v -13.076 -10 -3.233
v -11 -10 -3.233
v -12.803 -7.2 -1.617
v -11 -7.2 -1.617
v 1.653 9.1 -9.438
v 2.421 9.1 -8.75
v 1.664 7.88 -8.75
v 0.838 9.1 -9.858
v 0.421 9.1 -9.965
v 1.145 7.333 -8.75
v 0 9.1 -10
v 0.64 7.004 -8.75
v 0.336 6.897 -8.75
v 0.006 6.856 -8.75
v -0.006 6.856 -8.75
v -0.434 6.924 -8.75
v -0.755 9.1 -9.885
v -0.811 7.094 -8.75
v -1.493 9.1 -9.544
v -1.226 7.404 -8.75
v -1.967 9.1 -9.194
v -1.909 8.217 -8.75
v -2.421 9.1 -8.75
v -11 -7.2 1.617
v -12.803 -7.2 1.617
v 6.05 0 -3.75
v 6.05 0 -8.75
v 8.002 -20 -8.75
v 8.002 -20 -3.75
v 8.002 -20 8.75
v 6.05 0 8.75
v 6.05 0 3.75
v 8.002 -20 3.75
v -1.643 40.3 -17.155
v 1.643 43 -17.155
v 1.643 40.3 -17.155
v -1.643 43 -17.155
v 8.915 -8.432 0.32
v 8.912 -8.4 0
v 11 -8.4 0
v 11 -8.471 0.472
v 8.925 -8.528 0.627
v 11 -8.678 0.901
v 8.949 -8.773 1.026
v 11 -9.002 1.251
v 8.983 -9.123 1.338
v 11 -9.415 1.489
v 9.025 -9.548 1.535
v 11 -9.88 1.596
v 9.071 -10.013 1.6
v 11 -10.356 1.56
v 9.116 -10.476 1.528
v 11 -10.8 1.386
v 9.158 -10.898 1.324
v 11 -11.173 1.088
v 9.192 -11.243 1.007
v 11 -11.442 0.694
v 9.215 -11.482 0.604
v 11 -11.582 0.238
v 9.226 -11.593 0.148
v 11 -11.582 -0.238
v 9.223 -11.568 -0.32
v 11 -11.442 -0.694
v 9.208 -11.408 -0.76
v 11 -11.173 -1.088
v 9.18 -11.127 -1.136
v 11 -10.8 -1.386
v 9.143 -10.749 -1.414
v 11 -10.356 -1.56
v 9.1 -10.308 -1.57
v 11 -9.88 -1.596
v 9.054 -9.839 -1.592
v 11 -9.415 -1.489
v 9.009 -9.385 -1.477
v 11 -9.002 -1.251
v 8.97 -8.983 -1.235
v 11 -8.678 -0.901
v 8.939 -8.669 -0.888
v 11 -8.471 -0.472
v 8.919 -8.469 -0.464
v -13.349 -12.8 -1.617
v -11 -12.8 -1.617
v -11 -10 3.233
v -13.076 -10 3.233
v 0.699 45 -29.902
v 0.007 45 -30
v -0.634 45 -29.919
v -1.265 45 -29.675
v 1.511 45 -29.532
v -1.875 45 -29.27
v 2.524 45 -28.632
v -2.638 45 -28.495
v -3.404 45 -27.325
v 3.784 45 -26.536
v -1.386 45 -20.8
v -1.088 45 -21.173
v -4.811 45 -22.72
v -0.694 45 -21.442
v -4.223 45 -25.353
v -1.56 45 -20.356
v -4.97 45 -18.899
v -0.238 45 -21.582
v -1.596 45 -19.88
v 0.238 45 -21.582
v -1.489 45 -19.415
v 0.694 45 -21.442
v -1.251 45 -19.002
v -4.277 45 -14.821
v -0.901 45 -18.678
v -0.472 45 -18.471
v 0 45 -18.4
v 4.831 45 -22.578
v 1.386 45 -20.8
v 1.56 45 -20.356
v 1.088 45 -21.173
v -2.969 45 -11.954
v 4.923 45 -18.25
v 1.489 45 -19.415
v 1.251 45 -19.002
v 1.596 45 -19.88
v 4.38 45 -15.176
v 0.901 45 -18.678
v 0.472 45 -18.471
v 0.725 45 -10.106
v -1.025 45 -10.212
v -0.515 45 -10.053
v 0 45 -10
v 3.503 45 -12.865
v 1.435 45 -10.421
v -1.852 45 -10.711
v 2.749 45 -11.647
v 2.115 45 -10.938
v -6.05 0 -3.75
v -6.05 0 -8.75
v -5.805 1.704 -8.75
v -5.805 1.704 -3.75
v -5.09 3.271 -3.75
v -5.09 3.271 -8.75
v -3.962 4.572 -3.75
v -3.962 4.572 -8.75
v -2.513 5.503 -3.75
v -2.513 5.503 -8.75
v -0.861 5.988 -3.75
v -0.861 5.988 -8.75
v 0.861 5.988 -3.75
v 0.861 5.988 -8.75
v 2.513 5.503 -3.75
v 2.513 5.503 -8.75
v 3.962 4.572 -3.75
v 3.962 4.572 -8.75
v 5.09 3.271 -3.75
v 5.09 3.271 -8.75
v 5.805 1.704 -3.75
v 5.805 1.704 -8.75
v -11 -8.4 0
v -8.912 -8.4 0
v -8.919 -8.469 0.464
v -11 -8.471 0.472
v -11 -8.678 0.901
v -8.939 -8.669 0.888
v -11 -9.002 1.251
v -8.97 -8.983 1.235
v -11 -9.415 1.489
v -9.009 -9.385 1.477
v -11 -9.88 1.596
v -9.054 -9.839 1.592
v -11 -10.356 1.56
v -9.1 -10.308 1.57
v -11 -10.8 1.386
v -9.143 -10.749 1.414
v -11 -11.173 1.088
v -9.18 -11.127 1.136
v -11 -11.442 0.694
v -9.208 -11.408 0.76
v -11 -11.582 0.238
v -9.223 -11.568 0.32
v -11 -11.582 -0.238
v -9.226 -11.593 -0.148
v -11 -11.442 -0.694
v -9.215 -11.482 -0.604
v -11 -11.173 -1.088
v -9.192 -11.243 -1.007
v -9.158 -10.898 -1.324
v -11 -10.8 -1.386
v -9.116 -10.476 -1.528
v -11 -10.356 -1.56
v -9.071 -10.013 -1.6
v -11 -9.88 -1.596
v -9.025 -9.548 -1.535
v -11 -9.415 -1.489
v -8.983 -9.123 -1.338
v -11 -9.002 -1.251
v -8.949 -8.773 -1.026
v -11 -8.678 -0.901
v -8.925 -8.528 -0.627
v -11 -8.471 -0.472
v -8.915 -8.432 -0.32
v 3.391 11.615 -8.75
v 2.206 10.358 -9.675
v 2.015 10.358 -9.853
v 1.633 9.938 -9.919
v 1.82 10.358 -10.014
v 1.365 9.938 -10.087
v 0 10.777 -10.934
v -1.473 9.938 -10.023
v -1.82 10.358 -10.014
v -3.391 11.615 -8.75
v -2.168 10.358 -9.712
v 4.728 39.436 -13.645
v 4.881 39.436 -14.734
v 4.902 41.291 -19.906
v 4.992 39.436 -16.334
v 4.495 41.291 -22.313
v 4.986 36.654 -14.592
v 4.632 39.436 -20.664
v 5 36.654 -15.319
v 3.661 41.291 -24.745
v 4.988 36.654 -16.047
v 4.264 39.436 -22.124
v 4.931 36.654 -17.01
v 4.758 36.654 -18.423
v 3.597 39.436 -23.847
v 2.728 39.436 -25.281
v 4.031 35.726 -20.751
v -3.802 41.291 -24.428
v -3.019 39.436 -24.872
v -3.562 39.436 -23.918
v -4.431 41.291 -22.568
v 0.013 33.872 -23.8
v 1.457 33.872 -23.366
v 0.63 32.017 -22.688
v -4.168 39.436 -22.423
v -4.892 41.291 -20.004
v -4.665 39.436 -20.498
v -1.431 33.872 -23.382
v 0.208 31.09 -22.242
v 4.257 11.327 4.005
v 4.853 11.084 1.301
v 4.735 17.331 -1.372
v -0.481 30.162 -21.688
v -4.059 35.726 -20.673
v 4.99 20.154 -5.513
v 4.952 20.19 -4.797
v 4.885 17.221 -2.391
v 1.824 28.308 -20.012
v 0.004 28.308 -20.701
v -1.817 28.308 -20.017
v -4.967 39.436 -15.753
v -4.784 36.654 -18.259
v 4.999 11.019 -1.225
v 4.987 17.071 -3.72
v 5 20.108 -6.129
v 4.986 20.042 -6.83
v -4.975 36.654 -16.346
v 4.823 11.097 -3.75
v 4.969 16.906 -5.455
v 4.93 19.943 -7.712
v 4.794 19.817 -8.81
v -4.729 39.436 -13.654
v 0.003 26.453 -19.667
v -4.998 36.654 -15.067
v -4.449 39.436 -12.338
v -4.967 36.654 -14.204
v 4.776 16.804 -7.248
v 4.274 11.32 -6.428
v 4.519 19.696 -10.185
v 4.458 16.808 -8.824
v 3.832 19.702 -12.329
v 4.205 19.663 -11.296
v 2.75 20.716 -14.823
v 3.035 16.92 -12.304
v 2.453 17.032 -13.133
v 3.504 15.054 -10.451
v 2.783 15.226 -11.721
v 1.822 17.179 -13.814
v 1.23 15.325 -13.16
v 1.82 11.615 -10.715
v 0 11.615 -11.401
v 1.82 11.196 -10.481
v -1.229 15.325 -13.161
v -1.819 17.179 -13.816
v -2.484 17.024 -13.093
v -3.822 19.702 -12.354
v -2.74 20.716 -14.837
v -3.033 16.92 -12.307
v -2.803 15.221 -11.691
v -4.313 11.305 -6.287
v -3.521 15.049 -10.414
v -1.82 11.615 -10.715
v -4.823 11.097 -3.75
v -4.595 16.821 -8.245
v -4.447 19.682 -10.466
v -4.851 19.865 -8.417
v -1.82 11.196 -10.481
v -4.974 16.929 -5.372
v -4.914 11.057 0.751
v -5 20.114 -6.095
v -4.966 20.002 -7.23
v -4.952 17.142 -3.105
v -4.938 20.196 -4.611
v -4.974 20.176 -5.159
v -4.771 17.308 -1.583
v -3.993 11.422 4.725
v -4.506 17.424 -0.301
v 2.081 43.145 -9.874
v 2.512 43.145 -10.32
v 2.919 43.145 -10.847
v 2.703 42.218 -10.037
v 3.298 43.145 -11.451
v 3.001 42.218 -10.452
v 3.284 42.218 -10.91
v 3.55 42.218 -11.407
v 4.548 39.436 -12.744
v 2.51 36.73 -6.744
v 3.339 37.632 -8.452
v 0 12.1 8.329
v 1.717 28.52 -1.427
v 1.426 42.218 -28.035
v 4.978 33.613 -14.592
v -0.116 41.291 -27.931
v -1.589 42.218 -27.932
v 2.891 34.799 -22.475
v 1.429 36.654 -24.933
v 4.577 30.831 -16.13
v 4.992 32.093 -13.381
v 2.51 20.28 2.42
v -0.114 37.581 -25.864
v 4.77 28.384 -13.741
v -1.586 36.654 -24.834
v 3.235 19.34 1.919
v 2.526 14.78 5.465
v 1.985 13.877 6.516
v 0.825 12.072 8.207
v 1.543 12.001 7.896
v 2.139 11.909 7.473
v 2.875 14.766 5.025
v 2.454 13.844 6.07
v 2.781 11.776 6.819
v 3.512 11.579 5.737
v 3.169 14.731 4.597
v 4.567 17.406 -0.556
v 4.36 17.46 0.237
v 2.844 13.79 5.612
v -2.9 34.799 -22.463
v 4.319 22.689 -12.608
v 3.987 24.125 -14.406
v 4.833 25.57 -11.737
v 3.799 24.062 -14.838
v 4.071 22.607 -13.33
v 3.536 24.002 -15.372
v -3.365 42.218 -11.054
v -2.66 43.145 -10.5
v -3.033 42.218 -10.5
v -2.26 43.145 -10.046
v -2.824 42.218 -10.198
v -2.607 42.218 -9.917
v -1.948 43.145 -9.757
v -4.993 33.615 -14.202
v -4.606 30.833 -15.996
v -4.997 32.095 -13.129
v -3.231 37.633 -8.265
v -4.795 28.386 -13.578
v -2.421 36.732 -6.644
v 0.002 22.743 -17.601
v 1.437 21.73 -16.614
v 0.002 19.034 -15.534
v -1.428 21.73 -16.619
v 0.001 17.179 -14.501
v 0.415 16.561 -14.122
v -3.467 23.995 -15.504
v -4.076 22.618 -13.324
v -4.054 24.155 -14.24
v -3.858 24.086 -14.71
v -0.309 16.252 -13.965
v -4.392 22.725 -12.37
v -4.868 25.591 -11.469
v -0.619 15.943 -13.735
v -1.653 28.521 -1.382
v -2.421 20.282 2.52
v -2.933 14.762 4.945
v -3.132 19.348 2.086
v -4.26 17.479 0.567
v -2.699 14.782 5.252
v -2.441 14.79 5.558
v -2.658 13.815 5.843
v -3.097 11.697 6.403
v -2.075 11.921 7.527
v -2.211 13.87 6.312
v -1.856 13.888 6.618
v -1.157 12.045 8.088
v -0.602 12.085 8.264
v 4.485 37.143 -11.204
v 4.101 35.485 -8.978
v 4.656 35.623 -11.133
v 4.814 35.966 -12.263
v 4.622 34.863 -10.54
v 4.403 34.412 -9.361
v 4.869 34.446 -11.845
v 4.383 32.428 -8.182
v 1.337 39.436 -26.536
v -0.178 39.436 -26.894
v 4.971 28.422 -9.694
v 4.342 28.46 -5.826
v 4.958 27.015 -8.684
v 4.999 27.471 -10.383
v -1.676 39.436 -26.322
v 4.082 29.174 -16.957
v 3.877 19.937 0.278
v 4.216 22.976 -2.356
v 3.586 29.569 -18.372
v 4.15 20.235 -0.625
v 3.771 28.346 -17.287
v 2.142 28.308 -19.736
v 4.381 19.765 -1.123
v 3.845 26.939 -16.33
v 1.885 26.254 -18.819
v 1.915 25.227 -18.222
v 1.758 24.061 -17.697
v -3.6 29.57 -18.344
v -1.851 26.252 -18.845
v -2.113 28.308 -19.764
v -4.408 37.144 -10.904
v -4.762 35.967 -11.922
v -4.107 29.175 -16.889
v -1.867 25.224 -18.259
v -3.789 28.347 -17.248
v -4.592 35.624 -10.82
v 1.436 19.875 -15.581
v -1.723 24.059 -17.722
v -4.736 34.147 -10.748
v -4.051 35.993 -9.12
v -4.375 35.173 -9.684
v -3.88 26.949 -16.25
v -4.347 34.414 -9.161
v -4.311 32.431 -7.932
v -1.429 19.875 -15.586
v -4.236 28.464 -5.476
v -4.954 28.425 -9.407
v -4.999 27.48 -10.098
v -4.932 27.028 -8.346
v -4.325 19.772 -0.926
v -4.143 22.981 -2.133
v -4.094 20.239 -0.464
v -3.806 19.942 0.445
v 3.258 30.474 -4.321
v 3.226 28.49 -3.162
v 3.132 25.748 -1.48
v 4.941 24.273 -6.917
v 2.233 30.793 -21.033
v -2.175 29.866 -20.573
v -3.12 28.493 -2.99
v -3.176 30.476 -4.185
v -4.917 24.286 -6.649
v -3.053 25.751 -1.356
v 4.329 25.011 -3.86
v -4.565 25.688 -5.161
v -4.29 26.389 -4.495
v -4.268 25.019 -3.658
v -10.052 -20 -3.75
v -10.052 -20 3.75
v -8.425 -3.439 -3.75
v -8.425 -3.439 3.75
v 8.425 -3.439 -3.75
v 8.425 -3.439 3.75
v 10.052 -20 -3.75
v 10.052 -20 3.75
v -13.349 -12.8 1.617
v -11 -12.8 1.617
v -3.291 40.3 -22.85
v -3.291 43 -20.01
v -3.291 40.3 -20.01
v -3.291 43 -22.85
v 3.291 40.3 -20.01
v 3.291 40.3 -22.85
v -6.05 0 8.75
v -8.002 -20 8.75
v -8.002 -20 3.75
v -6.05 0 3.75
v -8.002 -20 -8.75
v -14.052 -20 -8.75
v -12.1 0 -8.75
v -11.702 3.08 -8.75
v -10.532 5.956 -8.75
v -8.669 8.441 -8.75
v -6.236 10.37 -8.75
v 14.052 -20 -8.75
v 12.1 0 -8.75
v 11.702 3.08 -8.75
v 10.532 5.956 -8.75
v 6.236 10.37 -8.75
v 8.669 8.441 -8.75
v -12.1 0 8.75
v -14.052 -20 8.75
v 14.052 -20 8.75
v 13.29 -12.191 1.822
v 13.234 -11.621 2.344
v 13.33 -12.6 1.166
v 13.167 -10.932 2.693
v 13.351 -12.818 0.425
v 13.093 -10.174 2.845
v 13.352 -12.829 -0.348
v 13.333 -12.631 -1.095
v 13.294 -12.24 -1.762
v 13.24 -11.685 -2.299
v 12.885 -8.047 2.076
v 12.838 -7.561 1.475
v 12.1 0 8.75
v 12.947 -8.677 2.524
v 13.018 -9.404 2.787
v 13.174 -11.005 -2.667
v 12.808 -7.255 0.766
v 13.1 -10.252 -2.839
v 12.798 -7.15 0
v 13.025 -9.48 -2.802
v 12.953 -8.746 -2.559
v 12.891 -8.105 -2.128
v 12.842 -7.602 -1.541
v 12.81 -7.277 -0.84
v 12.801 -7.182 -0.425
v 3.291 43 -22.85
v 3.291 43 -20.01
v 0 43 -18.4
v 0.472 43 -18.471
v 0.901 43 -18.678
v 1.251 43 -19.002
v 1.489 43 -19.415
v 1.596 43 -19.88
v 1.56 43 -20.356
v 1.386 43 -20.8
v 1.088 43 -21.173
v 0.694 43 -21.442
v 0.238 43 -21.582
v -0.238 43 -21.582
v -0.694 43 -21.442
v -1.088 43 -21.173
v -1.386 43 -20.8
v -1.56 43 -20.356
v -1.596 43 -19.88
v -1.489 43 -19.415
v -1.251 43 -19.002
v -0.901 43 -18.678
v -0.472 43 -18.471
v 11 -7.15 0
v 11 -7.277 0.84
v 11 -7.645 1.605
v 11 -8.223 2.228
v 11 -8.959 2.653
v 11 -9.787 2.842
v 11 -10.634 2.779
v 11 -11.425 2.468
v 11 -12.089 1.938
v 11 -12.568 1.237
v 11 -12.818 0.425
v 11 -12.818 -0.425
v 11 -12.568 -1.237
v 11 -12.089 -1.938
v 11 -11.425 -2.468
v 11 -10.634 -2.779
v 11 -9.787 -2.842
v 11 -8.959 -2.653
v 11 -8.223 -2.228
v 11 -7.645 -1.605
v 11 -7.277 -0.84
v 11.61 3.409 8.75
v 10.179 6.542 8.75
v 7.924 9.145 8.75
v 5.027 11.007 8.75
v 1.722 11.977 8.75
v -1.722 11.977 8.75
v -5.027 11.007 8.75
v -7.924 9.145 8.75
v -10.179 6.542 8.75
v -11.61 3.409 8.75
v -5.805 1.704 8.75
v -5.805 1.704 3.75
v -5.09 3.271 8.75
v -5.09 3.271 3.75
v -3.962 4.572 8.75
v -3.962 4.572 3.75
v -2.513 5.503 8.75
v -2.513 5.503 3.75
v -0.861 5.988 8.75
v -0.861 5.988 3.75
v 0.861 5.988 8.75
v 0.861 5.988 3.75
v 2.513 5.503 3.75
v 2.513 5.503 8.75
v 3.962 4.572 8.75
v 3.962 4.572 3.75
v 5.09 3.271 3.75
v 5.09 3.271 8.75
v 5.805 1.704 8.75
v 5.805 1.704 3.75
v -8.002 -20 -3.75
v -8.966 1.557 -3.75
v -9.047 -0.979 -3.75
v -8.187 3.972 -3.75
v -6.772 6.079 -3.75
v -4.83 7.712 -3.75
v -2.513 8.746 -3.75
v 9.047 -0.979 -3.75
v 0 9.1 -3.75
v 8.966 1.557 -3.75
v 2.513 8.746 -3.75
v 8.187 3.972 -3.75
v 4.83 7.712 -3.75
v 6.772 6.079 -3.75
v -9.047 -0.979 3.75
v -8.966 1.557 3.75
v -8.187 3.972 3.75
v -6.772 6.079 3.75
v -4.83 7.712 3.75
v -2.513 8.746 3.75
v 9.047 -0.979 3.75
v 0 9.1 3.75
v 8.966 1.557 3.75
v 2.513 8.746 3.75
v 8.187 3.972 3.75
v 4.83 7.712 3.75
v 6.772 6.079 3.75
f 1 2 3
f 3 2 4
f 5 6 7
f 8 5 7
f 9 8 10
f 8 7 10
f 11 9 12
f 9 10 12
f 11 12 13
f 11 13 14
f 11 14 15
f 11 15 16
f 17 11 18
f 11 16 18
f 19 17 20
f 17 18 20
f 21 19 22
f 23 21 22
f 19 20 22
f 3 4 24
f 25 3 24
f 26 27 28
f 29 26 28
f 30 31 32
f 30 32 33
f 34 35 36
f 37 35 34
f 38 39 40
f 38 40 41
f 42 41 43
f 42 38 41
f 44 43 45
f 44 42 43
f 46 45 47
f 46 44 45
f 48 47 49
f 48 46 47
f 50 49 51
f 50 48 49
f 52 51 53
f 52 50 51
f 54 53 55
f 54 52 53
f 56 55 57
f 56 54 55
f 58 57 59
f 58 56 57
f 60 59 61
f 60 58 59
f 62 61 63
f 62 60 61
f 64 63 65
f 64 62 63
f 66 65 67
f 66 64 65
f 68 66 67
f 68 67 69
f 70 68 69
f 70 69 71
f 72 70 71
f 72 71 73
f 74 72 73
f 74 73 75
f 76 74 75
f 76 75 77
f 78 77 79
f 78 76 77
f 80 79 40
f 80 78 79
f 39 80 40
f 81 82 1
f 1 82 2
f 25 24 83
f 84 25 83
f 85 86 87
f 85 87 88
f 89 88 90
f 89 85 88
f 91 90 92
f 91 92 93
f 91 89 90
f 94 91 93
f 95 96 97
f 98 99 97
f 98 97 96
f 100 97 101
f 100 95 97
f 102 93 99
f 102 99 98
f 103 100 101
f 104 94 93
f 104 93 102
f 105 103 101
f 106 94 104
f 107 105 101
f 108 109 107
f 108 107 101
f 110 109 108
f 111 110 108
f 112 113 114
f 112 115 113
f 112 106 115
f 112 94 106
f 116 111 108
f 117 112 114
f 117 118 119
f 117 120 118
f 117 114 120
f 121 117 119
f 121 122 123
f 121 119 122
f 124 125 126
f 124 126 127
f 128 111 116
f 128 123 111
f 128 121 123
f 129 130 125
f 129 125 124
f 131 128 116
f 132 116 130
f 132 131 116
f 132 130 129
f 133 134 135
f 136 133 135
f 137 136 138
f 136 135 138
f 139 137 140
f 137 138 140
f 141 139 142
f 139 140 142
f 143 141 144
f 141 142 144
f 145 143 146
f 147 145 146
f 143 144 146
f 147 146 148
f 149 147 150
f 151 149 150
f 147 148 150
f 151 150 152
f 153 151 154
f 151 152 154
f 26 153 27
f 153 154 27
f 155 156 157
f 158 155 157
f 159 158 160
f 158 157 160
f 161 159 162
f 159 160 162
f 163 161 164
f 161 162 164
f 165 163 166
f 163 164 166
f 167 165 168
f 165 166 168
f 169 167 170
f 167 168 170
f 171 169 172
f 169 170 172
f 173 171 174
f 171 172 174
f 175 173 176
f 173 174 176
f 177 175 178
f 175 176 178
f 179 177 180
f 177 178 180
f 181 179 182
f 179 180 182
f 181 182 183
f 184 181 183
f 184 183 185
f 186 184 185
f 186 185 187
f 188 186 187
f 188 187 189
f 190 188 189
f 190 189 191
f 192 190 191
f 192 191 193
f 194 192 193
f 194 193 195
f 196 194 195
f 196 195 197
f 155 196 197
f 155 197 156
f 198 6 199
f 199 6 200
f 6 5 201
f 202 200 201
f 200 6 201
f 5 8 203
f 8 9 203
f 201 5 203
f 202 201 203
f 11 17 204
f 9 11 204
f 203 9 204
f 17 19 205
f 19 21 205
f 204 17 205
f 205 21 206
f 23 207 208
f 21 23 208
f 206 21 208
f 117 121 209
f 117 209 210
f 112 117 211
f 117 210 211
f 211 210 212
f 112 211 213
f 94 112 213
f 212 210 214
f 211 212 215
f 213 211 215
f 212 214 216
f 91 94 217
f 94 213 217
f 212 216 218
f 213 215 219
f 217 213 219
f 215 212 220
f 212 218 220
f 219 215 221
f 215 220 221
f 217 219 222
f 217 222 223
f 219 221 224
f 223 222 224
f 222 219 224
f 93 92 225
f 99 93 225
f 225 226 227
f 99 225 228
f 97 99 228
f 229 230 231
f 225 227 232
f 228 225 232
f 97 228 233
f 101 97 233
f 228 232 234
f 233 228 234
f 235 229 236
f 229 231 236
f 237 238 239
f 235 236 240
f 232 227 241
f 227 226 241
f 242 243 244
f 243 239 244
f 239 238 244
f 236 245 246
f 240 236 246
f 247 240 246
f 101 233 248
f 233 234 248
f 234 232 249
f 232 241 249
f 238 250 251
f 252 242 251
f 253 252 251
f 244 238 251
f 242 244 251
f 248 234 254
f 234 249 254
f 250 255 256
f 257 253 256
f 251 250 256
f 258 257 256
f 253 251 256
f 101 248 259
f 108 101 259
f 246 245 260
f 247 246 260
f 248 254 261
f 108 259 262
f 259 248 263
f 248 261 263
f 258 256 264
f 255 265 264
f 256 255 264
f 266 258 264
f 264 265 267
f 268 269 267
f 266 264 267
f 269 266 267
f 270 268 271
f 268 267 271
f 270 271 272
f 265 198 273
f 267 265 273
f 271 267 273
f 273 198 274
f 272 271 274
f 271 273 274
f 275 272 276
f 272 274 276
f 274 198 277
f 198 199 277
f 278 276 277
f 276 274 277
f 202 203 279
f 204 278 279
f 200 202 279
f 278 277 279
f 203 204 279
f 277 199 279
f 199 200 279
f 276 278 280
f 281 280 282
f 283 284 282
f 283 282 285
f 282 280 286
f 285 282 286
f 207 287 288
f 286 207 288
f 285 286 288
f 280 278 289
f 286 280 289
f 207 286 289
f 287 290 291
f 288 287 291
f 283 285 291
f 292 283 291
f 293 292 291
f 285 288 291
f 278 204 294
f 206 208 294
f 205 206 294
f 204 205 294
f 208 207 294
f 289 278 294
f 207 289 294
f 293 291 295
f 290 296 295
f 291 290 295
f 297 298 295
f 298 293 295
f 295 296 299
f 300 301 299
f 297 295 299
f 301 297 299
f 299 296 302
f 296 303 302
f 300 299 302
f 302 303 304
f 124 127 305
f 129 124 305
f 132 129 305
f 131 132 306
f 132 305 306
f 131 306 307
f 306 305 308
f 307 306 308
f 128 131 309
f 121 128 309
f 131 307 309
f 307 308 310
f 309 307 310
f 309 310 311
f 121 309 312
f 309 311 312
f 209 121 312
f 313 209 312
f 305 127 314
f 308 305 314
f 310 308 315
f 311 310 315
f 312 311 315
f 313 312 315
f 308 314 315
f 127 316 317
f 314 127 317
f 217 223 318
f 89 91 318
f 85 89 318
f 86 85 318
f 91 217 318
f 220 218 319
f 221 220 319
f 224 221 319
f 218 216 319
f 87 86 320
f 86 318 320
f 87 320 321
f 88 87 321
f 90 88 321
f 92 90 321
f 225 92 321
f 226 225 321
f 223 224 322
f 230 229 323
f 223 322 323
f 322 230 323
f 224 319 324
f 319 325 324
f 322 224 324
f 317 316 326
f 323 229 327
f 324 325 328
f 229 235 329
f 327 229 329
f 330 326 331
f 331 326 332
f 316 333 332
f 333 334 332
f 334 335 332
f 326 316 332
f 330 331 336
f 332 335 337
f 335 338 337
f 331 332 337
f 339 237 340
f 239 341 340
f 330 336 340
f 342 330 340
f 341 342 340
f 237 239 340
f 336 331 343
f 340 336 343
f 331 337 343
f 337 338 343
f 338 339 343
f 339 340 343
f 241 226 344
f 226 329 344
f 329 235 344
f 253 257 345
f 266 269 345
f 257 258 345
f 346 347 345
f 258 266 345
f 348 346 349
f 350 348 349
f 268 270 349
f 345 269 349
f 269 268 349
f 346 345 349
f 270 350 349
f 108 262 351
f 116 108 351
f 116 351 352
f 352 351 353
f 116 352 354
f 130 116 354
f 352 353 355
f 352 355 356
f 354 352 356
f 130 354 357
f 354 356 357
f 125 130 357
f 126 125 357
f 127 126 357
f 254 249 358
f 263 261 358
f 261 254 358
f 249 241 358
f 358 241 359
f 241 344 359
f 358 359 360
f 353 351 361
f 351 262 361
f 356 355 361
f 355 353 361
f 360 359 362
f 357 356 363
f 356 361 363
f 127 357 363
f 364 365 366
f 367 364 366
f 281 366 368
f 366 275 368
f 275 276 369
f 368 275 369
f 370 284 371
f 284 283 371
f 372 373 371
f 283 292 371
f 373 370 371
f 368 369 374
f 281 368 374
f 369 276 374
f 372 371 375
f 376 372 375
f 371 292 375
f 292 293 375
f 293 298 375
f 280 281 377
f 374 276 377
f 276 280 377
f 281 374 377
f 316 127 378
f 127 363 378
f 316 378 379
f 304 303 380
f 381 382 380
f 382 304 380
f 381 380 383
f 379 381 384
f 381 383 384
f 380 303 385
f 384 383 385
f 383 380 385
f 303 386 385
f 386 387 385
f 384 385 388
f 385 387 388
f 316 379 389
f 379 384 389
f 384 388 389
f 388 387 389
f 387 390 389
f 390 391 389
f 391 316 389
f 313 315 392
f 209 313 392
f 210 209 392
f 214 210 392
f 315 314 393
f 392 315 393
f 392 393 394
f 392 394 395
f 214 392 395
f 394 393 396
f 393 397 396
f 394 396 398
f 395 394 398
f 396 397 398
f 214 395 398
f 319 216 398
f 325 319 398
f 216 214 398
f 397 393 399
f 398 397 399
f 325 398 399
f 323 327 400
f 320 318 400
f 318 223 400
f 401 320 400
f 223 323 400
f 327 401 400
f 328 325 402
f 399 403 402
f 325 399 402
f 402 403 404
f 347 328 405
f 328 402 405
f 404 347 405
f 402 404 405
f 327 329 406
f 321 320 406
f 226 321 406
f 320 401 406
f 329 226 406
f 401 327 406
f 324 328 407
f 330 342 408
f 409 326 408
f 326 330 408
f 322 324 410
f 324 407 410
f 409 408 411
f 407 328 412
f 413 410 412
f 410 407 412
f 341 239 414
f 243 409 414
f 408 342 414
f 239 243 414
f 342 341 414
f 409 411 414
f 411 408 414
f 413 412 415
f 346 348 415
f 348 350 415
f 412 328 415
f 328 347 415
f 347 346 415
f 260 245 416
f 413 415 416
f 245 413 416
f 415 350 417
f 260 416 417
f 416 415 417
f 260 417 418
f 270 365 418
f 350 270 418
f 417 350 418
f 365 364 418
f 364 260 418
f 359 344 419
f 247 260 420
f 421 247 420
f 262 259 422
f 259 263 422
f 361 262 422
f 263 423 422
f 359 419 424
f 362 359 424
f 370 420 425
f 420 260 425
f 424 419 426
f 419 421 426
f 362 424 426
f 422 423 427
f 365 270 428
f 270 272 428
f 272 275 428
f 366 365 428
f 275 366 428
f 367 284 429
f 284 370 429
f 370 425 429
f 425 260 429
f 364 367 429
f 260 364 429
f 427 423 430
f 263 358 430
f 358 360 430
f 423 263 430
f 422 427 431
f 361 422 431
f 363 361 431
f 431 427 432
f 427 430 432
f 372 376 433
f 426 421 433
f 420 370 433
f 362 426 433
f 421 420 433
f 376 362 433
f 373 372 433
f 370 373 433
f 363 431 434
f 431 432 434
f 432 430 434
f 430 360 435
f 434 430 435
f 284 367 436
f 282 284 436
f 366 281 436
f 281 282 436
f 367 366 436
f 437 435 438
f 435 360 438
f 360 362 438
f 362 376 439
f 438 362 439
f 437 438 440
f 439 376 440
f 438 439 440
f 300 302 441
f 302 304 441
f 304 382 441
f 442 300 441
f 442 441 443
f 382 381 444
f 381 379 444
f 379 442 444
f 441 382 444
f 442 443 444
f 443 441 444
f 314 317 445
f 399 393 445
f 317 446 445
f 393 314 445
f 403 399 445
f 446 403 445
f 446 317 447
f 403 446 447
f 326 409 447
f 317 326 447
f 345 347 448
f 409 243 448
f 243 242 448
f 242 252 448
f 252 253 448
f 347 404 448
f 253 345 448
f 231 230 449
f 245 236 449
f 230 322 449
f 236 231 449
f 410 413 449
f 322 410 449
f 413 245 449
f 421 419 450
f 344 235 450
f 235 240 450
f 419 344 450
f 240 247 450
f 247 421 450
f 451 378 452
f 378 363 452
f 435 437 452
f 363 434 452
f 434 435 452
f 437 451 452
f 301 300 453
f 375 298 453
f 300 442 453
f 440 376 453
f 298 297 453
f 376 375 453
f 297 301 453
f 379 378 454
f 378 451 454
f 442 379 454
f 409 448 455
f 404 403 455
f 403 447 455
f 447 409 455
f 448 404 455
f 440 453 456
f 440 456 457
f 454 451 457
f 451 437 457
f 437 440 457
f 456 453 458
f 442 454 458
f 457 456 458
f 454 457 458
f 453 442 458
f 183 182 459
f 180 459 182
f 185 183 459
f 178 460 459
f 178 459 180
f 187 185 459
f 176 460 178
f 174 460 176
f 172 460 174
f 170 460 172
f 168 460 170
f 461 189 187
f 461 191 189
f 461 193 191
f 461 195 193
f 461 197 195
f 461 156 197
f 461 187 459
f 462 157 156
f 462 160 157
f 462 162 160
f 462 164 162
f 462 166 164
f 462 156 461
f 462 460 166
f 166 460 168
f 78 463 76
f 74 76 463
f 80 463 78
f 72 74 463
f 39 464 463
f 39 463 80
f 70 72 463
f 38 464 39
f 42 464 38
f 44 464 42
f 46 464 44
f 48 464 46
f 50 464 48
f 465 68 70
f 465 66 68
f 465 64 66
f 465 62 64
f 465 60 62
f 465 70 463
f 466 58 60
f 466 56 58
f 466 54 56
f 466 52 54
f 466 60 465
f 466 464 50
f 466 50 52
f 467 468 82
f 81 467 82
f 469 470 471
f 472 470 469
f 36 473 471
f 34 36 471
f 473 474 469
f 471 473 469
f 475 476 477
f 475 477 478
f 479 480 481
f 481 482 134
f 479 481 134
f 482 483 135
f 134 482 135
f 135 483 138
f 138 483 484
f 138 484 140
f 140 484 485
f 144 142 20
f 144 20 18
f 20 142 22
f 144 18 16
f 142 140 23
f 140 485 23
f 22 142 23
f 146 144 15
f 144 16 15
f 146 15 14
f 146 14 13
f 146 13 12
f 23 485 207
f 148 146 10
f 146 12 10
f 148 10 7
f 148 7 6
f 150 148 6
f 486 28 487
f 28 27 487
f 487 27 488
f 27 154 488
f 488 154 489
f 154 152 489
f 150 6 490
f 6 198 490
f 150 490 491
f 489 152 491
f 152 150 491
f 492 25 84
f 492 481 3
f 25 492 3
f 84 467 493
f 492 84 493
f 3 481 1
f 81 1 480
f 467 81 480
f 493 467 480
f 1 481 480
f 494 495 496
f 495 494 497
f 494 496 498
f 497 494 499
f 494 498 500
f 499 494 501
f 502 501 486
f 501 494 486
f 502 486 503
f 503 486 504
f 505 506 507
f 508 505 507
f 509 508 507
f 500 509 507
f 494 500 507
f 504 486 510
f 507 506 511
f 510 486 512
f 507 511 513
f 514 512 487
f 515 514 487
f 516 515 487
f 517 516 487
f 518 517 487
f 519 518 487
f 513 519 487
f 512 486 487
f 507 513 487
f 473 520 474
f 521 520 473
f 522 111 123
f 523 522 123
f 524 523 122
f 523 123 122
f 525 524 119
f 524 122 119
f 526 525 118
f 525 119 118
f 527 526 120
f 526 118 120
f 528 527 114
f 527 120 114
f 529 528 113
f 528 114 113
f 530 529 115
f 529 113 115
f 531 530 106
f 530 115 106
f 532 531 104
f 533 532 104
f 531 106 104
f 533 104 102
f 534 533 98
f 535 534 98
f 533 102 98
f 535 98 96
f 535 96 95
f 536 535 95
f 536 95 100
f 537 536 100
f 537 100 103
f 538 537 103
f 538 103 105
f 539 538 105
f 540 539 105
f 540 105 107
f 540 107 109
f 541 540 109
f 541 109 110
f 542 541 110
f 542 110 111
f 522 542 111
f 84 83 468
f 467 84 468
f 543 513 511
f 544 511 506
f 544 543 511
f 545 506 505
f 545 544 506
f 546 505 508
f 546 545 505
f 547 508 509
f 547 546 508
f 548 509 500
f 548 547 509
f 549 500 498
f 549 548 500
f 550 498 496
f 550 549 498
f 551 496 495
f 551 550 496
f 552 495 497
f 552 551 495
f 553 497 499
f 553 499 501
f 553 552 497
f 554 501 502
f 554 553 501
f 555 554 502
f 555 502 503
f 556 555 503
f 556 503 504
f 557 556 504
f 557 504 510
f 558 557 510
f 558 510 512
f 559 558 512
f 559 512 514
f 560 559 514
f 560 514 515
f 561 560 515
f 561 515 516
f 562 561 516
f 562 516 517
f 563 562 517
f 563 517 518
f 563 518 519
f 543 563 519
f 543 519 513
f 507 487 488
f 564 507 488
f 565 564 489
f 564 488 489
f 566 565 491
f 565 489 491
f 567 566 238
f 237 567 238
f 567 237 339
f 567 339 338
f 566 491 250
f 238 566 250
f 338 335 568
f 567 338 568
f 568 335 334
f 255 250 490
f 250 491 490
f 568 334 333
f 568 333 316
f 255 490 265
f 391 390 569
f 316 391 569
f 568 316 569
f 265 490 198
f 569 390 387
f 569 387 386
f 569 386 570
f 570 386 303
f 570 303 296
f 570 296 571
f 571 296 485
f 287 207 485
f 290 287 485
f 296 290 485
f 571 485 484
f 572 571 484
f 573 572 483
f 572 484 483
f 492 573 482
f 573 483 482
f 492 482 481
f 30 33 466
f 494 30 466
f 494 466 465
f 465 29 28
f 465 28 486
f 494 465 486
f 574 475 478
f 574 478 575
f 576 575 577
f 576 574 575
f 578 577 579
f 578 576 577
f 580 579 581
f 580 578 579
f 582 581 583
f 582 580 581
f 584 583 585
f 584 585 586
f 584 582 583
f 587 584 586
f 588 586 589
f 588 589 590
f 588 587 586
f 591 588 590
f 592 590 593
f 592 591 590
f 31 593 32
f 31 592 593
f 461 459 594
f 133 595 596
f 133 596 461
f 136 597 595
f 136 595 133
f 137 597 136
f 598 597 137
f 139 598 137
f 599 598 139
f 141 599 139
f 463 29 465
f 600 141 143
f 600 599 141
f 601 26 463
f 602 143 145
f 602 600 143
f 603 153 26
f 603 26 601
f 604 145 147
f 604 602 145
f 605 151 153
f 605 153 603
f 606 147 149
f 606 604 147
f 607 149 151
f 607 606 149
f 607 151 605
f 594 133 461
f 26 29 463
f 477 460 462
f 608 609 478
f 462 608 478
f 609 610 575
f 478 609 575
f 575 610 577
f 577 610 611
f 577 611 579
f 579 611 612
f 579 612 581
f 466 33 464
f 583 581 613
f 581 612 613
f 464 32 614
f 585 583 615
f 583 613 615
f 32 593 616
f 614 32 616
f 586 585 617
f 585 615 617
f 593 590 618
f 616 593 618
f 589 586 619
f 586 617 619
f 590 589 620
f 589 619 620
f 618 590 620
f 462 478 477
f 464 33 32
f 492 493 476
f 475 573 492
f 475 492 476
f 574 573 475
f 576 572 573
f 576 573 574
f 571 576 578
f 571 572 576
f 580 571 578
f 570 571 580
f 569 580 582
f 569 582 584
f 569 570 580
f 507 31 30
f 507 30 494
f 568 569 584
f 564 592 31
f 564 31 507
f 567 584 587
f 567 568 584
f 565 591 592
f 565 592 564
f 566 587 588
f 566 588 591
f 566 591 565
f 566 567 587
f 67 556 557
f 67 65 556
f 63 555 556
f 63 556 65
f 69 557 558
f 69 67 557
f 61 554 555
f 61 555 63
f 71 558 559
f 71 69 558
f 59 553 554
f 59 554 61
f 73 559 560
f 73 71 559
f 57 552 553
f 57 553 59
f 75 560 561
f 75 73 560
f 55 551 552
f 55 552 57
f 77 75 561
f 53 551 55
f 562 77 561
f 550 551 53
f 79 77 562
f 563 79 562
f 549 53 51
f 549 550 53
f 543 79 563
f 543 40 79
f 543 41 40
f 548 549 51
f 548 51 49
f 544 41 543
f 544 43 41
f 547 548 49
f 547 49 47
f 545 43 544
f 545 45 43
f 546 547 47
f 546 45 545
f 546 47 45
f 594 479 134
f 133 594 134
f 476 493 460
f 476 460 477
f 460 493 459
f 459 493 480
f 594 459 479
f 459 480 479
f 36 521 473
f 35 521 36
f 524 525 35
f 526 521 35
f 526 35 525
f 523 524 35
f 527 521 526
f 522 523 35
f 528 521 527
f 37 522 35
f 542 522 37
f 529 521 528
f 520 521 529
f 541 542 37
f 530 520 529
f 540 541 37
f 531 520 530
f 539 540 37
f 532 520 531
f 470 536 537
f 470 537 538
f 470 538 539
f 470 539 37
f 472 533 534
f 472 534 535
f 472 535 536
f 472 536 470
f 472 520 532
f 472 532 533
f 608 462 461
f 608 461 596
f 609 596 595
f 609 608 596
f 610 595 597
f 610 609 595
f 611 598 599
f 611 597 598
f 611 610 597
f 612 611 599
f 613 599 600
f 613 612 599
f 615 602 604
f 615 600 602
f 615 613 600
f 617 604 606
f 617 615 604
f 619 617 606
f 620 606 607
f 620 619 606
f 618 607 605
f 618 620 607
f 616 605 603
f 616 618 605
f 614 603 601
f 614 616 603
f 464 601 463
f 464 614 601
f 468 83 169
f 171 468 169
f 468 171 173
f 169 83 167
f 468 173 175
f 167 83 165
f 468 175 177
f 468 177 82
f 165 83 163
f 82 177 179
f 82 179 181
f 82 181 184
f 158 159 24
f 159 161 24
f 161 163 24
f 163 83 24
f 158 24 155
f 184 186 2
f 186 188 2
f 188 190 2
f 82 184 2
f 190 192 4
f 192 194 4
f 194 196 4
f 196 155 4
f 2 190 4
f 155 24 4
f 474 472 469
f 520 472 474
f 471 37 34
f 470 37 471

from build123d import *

# Parameters (mm, degrees)
BOSS_EXTRUDE1_DEPTH         = 3.75
BOLT_HOLE_REACH             = 26.729
SKETCH2_R                   = 1.6
BOLT_HOLE_DIRECTION_2_REACH = 26.729
BOSS_EXTRUDE2_START         = 5
BOSS_EXTRUDE2_DEPTH         = 5
CUT_EXTRUDE2_START          = 11
SKETCH4_R                   = 2.85
CUT_EXTRUDE2_DEPTH          = 3
SKETCH7_RX                  = 10
SKETCH7_RY                  = 5
SWEEP2_START                = 10.247926509
SWEEP2_DEPTH                = 2.568432868
SKETCH11_W                  = 7.251223943
SKETCH11_H                  = 3.177760732
CUT_EXTRUDE3_DEPTH          = 20
CUT_EXTRUDE5_START          = -2
CUT_EXTRUDE5_DEPTH          = 2.7
SKETCH13_R                  = 1.6
CUT_EXTRUDE6_DEPTH          = 2.7
CUT_EXTRUDE7_START          = -11
CUT_EXTRUDE7_DEPTH          = 10


# Read off the part's stored shape, not the designer's step: Sweep2
with BuildPart() as part:
    # Sketch1 → Boss-Extrude1 (new, symmetric)
    with BuildSketch(Plane.XY):
        with BuildLine():
            Line((-12.1, 0), (-14.051700625, -20))
            Line((-14.051700625, -20), (-10.051700625, -20))
            Line((-10.051700625, -20), (-8.425, -3.439385846))
            ThreePointArc((-8.425, -3.439385846), (0, 9.1), (8.425, -3.439385846))
            Line((8.425, -3.439385846), (10.051700625, -20))
            Line((10.051700625, -20), (14.051700625, -20))
            Line((14.051700625, -20), (12.1, 0))
            ThreePointArc((12.1, 0), (0, 12.1), (-12.1, 0))
        make_face()
    extrude(amount=BOSS_EXTRUDE1_DEPTH, both=True)

    # Bolt Hole: up to this plane
    bolt_hole_end = Plane(origin=(14.051700625, -20, 3.75), z_dir=(-0.995272319868323, -0.09712368044883128, 0))
    # Sketch2 → Bolt Hole (cut, up to the surface)
    with BuildSketch(Plane(origin=(0, 0, 0), x_dir=(0, 0, -1), z_dir=(1, 0, 0)), mode=Mode.PRIVATE) as bolt_hole_sk1:
        with Locations(Location((0, -10, 0), (0, 0, 90))):
            Circle(SKETCH2_R)
    bolt_hole_tool1 = split(extrude(bolt_hole_sk1.sketch, amount=BOLT_HOLE_REACH, mode=Mode.PRIVATE), bisect_by=bolt_hole_end, keep=Keep.BOTH, mode=Mode.PRIVATE)
    add(bolt_hole_tool1.solids().sort_by_distance((0, -10, 0))[0], mode=Mode.SUBTRACT)

    # Bolt Hole direction 2: up to this plane
    bolt_hole_direction_2_end = Plane(origin=(-12.1, 0, 3.75), z_dir=(0.995272319868323, -0.09712368044883138, 0))
    # Sketch2 → Bolt Hole direction 2 (cut, up to the surface)
    with BuildSketch(Plane(origin=(0, 0, 0), x_dir=(0, 0, -1), z_dir=(1, 0, 0)), mode=Mode.PRIVATE) as bolt_hole_direction_2_sk1:
        with Locations(Location((0, -10, 0), (0, 0, 90))):
            Circle(SKETCH2_R)
    bolt_hole_direction_2_tool1 = split(extrude(bolt_hole_direction_2_sk1.sketch, amount=-BOLT_HOLE_DIRECTION_2_REACH, mode=Mode.PRIVATE), bisect_by=bolt_hole_direction_2_end, keep=Keep.BOTH, mode=Mode.PRIVATE)
    add(bolt_hole_direction_2_tool1.solids().sort_by_distance((0, -10, 0))[0], mode=Mode.SUBTRACT)

    # Sketch3 → Boss-Extrude2 (add)
    with BuildSketch(Plane.XY.offset(3.75).offset(BOSS_EXTRUDE2_START)):
        with BuildLine():
            ThreePointArc((12.1, 0), (0, 12.1), (-12.1, 0))
            Line((-12.1, 0), (-6.05, 0))
            ThreePointArc((-6.05, 0), (0, 6.05), (6.05, 0))
            Line((6.05, 0), (12.1, 0))
        make_face()
        Polygon((-6.05, 0), (-12.1, 0), (-14.051700625, -20), (-8.001700625, -20), align=None)
        Polygon((14.051700625, -20), (12.1, 0), (6.05, 0), (8.001700625, -20), align=None)
    boss_extrude2 = extrude(amount=-BOSS_EXTRUDE2_DEPTH)

    # Sketch4 → Cut-Extrude2 (cut)
    with BuildSketch(Plane(origin=(0, 0, 0), x_dir=(0, 0, -1), z_dir=(1, 0, 0)).offset(CUT_EXTRUDE2_START)):
        with Locations(Location((0, -10, 0), (0, 0, 90))):
            Circle(SKETCH4_R)
    extrude(amount=CUT_EXTRUDE2_DEPTH, mode=Mode.SUBTRACT)

    # Sweep1: sweep along a path in Sketch8
    with BuildLine(Plane(origin=(0, 0, 0), x_dir=(0, 0, -1), z_dir=(1, 0, 0))) as sweep1_path:
        Line((20, 45), (0, 9.1))
    # Sketch7 → Sweep1 (sweep)
    with BuildSketch(Plane(origin=(0, 45, 0), x_dir=(1, 0, 0), z_dir=(0, 1, 0))):
        with Locations(Location((0, 20), (0, 0, -90))):
            Ellipse(SKETCH7_RX, SKETCH7_RY)
    sweep(path=sweep1_path.line)

    # Mirror2: Boss-Extrude2 across plane
    add(boss_extrude2.mirror(Plane.XY))

    # Sweep2 outline → Sweep2 (add)
    with BuildSketch(Plane(origin=(0, 0, 0), x_dir=(1, 0, 0), z_dir=(0, 0.8735827557825672, -0.48667562996243774)).offset(SWEEP2_START)):
        with BuildLine():
            add(Edge.make_bspline(
                [(-2.420614591, 3.21510088), (-4.140808386, 1.552228138), (-6.669000046, -3.159441487), (-5.965430129, -9.385769202), (-3.27241307, -12.380396445), (-1.32464484, -13.16457579), (1.32464484, -13.16457579), (3.27241307, -12.380396445), (5.965430129, -9.385769202), (6.669000046, -3.159441487), (4.140808386, 1.552228138), (1.714602002, 3.897587408), (0.891272318, 4.380182485), (0, 4.554319728), (-0.891272318, 4.380182485), (-1.714602002, 3.897587408), (-2.420614591, 3.21510088)],
                knots=[0.602606548, 0.602606548, 0.602606548, 0.602606548, 0.602606548, 0.602606548, 0.602606548, 1, 1, 1, 1, 1, 1.397393452, 1.397393452, 1.397393452, 1.397393452, 1.397393452, 1.560494133, 1.560494133, 1.560494133, 1.560494133, 1.560494133, 1.560494133, 1.560494133], degree=6, weights=[1, 1, 0.816743691, 0.81626183, 0.938272083, 1, 1, 0.938272083, 0.81626183, 0.816743691, 1, 1, 0.995833333, 0.99375, 0.995833333, 1, 1]))
        make_face()
    extrude(amount=SWEEP2_DEPTH)

    # Sketch11 → Cut-Extrude3 (cut)
    with BuildSketch(Plane(origin=(0, 0, 0), x_dir=(1, 0, 0), z_dir=(0, 1, 0))):
        with Locations((-0.008642554, -10.338880366)):
            Rectangle(SKETCH11_W, SKETCH11_H)
    extrude(amount=CUT_EXTRUDE3_DEPTH, mode=Mode.SUBTRACT)

    # Sketch12 → Cut-Extrude5 (cut)
    with BuildSketch(Plane(origin=(0, 45, 0), x_dir=(1, 0, 0), z_dir=(0, 1, 0)).offset(CUT_EXTRUDE5_START)):
        Polygon((-3.290892766, 20.010039827), (-3.290892766, 22.85), (3.290892766, 22.85), (3.290892766, 20.010039827), (1.642548134, 17.155023177), (-1.642548134, 17.155023177), align=None)
    extrude(amount=-CUT_EXTRUDE5_DEPTH, mode=Mode.SUBTRACT)

    # Sketch13 → Cut-Extrude6 (cut)
    with BuildSketch(Plane(origin=(0, 45, 0), x_dir=(1, 0, 0), z_dir=(0, 1, 0))):
        with Locations(Location((0, 20, 0), (0, 0, 270))):
            Circle(SKETCH13_R)
    extrude(amount=-CUT_EXTRUDE6_DEPTH, mode=Mode.SUBTRACT)

    # Sketch14 → Cut-Extrude7 (cut)
    with BuildSketch(Plane(origin=(0, 0, 0), x_dir=(0, 0, -1), z_dir=(1, 0, 0)).offset(CUT_EXTRUDE7_START)):
        Polygon((-3.233161507, -10), (-1.616580754, -12.8), (1.616580754, -12.8), (3.233161507, -10), (1.616580754, -7.2), (-1.616580754, -7.2), align=None)
    extrude(amount=-CUT_EXTRUDE7_DEPTH, mode=Mode.SUBTRACT)


solid = part.part
